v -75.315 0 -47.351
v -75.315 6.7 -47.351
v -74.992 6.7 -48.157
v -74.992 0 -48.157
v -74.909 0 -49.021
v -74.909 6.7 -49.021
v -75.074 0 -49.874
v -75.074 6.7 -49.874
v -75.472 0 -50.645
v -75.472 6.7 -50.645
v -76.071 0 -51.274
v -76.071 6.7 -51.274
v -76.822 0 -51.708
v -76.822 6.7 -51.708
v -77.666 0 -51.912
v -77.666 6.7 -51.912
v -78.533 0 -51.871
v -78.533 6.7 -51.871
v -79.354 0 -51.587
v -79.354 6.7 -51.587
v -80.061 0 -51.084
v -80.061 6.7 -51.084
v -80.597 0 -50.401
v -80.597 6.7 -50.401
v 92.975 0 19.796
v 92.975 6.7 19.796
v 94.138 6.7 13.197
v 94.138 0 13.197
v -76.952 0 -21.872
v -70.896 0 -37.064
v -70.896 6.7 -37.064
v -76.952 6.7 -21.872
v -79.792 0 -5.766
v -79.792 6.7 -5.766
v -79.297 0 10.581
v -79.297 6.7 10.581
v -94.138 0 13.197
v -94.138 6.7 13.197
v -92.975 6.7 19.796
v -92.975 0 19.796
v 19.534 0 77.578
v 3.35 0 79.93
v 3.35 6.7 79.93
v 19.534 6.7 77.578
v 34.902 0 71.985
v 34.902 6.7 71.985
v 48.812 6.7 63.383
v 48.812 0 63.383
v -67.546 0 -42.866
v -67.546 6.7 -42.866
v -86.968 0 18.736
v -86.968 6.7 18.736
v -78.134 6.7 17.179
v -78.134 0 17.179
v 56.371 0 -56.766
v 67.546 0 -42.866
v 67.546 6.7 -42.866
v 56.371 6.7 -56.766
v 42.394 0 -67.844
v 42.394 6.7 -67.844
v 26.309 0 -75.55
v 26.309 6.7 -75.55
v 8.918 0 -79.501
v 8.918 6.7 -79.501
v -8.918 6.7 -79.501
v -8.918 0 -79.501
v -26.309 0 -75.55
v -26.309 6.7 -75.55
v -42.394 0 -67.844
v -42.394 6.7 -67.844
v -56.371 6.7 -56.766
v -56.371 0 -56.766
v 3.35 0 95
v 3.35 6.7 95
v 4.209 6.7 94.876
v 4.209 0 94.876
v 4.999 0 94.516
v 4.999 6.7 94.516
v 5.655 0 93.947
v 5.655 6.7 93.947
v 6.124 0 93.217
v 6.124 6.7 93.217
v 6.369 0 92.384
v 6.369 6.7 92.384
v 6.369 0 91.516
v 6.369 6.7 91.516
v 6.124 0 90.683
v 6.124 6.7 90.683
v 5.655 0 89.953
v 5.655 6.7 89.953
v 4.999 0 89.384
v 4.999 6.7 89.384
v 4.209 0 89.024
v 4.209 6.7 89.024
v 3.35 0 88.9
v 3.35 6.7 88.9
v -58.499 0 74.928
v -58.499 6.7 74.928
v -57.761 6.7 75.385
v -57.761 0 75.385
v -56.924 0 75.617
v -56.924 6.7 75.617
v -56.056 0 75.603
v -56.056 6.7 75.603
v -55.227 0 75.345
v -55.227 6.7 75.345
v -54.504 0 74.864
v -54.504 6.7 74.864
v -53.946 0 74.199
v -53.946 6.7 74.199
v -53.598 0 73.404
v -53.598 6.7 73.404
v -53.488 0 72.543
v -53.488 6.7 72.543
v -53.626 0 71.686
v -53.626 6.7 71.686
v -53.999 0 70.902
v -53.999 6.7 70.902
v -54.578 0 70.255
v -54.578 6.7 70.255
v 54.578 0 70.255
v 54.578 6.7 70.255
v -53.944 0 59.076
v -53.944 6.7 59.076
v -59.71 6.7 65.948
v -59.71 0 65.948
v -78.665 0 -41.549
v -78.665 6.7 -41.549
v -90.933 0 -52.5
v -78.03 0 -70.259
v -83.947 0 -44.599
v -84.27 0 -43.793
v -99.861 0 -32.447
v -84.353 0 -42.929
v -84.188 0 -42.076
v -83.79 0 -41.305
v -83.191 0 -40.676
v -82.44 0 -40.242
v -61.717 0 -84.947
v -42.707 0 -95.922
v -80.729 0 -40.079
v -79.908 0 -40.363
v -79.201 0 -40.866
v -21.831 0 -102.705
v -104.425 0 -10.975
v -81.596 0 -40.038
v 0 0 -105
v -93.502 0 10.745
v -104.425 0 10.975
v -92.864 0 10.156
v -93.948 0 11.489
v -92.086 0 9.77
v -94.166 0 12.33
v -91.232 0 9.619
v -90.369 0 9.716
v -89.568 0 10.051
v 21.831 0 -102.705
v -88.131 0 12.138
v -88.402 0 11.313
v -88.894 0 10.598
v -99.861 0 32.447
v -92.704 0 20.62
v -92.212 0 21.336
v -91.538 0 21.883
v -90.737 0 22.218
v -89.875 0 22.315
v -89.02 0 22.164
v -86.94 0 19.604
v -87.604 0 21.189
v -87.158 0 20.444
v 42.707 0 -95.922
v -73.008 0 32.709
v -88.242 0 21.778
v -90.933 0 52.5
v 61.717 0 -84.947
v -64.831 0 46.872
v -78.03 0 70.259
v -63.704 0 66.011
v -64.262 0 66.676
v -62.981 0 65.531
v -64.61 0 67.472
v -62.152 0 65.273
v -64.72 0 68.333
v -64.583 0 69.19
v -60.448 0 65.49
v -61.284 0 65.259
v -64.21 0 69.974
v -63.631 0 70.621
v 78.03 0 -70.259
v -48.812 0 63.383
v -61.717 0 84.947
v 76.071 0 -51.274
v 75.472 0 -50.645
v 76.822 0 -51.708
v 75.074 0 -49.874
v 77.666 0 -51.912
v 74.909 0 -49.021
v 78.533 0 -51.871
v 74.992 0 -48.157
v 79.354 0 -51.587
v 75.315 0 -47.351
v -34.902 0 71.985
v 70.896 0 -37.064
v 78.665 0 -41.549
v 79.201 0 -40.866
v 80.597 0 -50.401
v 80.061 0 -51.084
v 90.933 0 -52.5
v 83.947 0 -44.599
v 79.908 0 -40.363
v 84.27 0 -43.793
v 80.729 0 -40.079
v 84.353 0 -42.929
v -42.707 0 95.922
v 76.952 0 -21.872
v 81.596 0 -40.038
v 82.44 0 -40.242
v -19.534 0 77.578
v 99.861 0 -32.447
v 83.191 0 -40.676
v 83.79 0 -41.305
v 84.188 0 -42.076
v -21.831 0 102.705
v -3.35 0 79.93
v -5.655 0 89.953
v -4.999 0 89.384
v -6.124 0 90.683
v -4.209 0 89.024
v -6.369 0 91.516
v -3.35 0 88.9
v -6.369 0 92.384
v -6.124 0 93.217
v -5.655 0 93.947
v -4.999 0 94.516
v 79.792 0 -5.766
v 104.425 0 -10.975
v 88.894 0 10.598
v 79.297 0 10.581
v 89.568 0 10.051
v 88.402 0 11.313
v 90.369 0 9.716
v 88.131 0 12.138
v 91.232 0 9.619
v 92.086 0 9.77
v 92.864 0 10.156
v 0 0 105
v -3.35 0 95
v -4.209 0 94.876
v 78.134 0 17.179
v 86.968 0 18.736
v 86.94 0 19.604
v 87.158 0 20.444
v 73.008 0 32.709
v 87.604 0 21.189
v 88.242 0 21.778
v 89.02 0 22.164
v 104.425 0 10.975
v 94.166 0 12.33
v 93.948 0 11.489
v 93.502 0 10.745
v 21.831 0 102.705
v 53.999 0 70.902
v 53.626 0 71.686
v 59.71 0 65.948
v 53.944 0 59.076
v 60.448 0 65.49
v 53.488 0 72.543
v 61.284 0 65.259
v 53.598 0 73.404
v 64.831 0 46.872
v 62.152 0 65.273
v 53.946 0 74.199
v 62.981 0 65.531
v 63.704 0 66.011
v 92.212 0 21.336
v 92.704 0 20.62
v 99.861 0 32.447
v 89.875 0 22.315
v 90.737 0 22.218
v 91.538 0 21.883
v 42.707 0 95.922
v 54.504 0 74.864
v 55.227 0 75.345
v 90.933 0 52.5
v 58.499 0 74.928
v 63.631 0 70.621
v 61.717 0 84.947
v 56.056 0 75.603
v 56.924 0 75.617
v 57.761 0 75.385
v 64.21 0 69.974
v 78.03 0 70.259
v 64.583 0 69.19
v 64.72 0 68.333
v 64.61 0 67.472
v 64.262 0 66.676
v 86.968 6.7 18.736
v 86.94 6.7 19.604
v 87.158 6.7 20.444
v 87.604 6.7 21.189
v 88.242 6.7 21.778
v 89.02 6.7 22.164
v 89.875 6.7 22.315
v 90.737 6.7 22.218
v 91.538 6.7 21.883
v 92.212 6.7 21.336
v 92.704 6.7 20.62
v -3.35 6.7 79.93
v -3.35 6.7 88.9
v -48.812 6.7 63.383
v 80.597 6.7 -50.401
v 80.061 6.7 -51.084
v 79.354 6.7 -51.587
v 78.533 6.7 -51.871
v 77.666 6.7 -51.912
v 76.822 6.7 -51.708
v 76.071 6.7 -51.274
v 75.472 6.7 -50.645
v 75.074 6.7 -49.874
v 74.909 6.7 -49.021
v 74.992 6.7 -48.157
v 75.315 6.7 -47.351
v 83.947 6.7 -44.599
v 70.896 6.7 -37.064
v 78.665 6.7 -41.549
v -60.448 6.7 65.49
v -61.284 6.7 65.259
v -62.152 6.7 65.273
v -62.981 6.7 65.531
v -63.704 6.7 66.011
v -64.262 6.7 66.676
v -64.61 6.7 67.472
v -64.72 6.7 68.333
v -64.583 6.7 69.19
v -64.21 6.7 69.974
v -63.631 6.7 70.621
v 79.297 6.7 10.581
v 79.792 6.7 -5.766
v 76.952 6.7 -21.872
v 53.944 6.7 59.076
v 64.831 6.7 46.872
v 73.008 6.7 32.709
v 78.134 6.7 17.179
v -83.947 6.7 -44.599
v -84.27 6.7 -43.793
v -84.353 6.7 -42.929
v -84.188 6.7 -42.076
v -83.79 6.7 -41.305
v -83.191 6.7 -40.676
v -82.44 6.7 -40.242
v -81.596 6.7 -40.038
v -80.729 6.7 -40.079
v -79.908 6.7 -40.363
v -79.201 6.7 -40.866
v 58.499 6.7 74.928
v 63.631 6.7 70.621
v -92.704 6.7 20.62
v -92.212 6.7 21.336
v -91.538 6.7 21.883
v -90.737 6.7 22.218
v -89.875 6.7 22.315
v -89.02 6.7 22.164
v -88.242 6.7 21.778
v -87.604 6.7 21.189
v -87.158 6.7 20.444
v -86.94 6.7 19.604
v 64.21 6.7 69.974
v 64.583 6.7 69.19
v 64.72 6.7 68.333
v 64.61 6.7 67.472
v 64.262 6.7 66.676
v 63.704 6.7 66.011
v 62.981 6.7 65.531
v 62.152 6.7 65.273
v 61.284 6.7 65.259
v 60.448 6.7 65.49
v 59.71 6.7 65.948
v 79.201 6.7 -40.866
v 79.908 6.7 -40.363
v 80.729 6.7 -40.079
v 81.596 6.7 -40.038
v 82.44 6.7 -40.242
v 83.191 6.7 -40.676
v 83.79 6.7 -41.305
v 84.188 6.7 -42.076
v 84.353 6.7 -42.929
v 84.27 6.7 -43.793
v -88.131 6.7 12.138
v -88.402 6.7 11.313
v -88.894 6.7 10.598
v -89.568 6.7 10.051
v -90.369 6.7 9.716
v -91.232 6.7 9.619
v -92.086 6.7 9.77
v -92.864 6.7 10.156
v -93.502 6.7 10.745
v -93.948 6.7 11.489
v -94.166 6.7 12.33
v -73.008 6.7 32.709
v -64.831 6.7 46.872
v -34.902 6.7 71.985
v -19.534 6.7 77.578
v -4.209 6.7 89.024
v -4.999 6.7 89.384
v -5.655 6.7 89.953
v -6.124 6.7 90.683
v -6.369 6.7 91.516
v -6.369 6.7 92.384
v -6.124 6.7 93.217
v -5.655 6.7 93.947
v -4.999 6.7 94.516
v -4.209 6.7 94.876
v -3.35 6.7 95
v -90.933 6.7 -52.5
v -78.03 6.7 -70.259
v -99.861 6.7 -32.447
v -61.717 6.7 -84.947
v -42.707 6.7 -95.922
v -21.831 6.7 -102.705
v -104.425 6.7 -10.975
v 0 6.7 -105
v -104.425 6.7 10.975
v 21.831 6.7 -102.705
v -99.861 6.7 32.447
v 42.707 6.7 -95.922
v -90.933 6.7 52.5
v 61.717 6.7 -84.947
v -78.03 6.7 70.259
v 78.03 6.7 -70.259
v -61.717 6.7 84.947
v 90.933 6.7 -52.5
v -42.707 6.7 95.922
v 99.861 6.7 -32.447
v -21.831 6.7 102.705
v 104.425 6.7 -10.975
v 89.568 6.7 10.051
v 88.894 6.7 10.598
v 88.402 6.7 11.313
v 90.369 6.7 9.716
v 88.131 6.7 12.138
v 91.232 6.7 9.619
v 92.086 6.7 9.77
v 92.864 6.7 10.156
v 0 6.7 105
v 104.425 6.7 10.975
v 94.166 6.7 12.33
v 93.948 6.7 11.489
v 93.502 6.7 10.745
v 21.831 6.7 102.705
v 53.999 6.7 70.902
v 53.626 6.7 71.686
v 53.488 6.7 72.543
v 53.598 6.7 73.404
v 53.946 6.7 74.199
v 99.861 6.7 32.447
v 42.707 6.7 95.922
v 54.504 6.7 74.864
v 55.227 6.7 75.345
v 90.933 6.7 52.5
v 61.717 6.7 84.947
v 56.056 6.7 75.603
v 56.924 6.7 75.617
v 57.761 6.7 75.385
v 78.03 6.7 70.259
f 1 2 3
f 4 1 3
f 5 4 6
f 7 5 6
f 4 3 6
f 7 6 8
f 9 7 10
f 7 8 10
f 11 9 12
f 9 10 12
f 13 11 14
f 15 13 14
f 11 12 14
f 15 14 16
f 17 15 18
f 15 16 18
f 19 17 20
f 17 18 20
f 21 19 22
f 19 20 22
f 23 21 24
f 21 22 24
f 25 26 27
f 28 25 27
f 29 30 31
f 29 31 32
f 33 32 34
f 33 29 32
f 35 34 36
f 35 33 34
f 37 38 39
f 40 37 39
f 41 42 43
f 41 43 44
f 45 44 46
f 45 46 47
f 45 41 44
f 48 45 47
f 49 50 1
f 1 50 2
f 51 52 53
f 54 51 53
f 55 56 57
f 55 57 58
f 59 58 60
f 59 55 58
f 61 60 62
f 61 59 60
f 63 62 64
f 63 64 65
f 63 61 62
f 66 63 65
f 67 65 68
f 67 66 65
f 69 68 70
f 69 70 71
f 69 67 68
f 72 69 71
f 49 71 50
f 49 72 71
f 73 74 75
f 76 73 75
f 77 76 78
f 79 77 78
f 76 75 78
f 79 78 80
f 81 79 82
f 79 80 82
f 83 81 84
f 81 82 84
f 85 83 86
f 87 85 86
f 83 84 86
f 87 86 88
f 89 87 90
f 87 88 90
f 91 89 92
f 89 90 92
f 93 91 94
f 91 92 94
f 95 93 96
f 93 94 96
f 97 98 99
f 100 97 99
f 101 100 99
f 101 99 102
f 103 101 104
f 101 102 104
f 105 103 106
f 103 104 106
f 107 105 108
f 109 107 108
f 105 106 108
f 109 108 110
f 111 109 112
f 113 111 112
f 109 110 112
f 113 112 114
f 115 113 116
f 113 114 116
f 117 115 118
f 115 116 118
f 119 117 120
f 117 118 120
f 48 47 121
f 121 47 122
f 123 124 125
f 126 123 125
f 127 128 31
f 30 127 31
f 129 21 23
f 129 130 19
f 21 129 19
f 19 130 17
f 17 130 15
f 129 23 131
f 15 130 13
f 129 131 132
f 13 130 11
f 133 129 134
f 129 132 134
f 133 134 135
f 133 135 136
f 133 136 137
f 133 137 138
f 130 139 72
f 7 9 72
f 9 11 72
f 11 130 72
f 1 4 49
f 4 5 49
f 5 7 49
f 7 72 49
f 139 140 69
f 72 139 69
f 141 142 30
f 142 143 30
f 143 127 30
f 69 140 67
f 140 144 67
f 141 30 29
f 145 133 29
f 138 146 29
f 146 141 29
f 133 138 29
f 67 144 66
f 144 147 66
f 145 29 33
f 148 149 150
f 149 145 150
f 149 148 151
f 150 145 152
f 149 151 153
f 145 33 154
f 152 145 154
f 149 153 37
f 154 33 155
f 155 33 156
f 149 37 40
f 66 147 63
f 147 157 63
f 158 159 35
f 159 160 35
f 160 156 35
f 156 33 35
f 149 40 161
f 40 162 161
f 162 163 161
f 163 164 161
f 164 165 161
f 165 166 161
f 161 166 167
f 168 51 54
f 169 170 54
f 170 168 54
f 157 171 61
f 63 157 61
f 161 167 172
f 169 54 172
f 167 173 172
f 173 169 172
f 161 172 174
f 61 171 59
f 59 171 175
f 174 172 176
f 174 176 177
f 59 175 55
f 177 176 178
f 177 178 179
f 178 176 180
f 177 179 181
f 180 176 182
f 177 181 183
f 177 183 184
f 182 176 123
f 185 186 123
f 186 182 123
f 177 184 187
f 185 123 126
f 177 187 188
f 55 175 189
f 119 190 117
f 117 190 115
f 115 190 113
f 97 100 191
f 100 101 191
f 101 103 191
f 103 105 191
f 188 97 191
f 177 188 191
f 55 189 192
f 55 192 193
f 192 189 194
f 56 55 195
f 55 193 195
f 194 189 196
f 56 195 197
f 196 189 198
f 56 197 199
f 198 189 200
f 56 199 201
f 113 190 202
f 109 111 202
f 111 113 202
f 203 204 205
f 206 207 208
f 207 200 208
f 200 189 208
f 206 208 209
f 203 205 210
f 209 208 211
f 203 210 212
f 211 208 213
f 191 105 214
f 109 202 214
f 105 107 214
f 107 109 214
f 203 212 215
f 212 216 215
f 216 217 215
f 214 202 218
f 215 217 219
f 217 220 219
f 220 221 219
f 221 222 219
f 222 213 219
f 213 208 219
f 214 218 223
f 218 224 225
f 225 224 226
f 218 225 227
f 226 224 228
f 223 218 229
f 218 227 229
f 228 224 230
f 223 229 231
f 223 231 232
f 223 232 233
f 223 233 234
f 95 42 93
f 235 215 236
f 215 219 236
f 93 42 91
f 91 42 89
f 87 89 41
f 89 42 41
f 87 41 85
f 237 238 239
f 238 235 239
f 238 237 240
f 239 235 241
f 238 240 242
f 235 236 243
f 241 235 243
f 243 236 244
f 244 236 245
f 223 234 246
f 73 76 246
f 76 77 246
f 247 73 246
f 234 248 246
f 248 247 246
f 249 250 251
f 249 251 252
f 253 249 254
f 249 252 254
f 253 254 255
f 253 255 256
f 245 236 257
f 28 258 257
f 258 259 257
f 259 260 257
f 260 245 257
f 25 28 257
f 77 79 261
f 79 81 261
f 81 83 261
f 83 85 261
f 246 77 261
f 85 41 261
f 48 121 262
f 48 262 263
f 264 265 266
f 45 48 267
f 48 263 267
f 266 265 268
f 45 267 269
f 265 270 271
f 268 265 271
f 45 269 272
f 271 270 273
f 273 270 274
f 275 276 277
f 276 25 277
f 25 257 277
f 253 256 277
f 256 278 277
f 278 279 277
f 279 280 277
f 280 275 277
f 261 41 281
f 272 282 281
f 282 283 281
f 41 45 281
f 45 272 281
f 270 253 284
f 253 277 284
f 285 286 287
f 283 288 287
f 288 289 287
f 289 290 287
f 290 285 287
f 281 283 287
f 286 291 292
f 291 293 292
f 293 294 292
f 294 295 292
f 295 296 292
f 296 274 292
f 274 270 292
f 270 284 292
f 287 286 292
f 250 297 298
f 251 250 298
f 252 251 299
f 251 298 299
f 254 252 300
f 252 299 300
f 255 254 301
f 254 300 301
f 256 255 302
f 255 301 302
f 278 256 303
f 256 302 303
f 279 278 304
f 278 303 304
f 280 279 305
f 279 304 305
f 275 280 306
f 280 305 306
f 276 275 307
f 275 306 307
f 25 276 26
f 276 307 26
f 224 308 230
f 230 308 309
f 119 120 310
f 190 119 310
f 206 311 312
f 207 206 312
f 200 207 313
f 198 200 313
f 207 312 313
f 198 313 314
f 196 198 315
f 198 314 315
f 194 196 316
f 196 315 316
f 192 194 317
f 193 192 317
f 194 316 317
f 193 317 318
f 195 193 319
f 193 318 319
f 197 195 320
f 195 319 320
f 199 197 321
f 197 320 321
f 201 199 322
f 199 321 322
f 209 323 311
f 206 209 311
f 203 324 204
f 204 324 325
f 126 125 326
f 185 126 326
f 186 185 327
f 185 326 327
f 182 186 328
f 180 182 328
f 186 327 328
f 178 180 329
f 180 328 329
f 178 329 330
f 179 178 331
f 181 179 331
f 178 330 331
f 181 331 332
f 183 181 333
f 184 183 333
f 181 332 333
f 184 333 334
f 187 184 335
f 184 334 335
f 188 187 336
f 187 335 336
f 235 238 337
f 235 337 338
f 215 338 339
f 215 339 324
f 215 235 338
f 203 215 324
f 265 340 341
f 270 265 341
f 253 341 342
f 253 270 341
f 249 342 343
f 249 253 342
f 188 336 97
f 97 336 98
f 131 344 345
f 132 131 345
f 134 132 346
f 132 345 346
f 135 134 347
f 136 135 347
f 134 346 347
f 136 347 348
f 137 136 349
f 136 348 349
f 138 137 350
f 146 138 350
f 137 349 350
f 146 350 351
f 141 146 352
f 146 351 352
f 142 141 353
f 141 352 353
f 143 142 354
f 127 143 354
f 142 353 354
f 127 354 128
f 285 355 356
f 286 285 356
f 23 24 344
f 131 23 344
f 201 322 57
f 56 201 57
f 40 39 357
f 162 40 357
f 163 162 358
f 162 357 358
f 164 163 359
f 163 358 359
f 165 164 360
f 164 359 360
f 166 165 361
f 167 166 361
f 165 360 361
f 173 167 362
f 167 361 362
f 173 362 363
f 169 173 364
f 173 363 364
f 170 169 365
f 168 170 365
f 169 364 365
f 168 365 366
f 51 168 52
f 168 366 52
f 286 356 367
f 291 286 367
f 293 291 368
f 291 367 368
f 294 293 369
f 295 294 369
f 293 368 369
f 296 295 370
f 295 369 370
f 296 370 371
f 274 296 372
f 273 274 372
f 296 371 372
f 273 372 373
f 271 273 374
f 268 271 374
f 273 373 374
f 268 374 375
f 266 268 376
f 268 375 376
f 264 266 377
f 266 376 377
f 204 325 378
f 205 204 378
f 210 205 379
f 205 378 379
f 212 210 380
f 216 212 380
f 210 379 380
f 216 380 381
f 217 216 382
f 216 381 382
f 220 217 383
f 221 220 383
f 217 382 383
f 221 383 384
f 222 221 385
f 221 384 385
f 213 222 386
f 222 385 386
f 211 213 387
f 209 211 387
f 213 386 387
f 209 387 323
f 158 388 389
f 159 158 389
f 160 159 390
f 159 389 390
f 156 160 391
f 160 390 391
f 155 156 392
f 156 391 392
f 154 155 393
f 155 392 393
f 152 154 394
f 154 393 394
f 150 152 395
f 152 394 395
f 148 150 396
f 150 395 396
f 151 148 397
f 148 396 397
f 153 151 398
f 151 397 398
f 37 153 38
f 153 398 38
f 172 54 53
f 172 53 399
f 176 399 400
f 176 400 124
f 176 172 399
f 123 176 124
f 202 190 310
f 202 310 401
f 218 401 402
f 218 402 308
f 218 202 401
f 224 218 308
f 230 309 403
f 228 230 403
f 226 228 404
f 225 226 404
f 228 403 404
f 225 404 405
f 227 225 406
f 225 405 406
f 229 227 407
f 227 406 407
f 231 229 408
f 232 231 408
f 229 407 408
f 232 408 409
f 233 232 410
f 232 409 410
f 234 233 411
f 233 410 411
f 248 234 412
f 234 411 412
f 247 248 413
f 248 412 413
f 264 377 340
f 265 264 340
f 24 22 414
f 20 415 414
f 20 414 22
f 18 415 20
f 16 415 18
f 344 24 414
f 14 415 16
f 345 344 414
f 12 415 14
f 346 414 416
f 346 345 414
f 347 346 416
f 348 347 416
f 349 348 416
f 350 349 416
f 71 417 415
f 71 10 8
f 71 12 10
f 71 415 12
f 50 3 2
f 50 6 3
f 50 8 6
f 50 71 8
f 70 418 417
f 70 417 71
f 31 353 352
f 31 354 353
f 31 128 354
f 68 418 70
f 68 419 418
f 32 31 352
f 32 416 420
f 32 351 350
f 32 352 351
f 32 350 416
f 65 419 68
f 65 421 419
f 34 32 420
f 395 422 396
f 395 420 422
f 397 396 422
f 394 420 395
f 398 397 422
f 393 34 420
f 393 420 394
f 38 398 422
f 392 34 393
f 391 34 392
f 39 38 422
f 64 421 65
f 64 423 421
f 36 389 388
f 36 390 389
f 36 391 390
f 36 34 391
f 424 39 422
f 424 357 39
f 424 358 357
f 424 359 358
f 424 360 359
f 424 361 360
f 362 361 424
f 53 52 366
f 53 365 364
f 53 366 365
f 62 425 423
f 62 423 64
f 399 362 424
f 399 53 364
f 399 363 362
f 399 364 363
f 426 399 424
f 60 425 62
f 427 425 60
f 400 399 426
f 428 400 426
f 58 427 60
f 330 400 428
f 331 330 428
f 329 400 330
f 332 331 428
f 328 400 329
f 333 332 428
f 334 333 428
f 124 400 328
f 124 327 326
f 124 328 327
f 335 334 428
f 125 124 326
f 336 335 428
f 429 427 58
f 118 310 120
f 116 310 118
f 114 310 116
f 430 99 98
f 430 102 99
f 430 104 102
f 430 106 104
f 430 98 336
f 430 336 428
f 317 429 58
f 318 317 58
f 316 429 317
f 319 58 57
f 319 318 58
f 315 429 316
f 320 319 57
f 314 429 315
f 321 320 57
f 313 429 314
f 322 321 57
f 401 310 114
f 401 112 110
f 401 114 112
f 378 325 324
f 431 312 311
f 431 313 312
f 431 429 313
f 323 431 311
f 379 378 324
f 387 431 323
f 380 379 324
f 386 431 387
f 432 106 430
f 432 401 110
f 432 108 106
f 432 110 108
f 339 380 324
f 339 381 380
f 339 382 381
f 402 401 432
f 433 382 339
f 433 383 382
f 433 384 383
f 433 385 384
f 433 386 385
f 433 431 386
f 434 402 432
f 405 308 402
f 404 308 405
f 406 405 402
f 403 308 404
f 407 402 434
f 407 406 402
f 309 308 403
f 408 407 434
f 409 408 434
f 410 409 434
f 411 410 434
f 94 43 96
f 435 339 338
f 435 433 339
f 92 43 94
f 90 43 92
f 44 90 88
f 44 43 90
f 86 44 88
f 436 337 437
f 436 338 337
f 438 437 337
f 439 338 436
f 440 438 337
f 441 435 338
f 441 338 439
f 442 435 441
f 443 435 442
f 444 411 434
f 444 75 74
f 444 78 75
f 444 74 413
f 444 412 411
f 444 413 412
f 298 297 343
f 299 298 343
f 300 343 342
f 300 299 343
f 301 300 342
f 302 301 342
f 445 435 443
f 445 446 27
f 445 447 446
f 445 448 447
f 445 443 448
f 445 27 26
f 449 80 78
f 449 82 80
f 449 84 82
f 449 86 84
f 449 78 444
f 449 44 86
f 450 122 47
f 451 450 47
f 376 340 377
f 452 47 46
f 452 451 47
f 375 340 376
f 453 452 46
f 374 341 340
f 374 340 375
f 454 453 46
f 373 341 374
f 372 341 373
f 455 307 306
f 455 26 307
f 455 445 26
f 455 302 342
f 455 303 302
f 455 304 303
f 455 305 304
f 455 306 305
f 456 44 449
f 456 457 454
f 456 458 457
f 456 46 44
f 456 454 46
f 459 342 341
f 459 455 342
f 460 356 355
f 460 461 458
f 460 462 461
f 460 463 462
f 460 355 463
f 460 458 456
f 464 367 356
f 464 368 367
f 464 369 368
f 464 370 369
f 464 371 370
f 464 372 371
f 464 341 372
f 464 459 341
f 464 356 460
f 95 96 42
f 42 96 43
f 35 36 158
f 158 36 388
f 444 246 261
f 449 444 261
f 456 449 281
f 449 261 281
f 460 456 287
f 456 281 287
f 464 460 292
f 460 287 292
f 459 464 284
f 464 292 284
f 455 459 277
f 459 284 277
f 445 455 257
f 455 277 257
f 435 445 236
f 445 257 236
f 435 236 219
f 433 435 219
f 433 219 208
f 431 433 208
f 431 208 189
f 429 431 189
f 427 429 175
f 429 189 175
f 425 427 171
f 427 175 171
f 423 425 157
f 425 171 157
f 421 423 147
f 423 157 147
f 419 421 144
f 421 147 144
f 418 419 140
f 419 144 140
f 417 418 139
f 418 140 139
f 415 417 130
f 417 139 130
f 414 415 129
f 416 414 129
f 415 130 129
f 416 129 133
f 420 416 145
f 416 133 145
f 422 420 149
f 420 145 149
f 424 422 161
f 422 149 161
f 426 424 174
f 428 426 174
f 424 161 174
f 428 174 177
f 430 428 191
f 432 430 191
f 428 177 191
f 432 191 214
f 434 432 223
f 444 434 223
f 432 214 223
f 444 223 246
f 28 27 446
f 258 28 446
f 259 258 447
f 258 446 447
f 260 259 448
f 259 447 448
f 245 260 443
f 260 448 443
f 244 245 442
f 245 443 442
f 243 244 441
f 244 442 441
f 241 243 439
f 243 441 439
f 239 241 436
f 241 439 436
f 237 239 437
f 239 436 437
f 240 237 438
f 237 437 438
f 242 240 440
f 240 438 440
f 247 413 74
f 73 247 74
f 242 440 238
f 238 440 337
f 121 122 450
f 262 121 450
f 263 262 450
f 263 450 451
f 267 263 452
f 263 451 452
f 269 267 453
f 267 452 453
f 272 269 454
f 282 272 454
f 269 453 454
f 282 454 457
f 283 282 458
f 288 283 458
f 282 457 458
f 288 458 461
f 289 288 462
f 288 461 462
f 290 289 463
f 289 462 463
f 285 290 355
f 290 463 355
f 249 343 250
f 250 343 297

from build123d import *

# Parameters (mm, degrees)
SKETCH1_R           = 105
SKETCH1_R_2         = 80
BOSS_EXTRUDE1_DEPTH = 6.7
CUT_EXTRUDE3_DEPTH  = 6.7


with BuildPart() as part:
    # Sketch1 → Boss-Extrude1 (new body)
    with BuildSketch(Plane(origin=(0, 0, 0), x_dir=(1, 0, 0), z_dir=(0, 1, 0))):
        with Locations(Location((0, 0, 0), (0, 0, 270))):
            Circle(SKETCH1_R)
        with Locations(Location((0, 0, 0), (0, 0, 270))):
            Circle(SKETCH1_R_2, mode=Mode.SUBTRACT)
    extrude(amount=BOSS_EXTRUDE1_DEPTH)

    # Sketch2 → Cut-Extrude3 (cut)
    with BuildSketch(Plane(origin=(0, 6.7, 0), x_dir=(1, 0, 0), z_dir=(0, 1, 0))):
        with BuildLine():
            Line((88.131130638, -12.138217022), (74.442302871, -9.724507352))
            Line((74.442302871, -9.724507352), (73.278860081, -16.322719298))
            Line((73.278860081, -16.322719298), (86.967687848, -18.736428967))
            ThreePointArc((86.967687848, -18.736428967), (89.441724552, -22.269719556), (92.975015141, -19.795682851))
            Line((92.975015141, -19.795682851), (94.138457931, -13.197470906))
            ThreePointArc((94.138457931, -13.197470906), (91.664421227, -9.664180317), (88.131130638, -12.138217022))
        make_face()
        with BuildLine():
            Line((75.314658396, 47.351185103), (63.276905284, 40.401185103))
            Line((63.276905284, 40.401185103), (66.626905284, 34.598814897))
            Line((66.626905284, 34.598814897), (78.664658396, 41.548814897))
            ThreePointArc((78.664658396, 41.548814897), (82.831035878, 40.432437416), (83.94741336, 44.598814897))
            Line((83.94741336, 44.598814897), (80.59741336, 50.401185103))
            ThreePointArc((80.59741336, 50.401185103), (76.431035878, 51.517562584), (75.314658396, 47.351185103))
        make_face()
        with BuildLine():
            Line((59.710067386, -65.948012501), (50.775319611, -55.299994741))
            Line((50.775319611, -55.299994741), (45.642821842, -59.606671726))
            Line((45.642821842, -59.606671726), (54.577569617, -70.254689486))
            ThreePointArc((54.577569617, -70.254689486), (54.201636275, -74.551627247), (58.498574036, -74.927560589))
            Line((58.498574036, -74.927560589), (63.631071805, -70.620883604))
            ThreePointArc((63.631071805, -70.620883604), (64.007005147, -66.323945843), (59.710067386, -65.948012501))
        make_face()
        with BuildLine():
            Line((3.35, -88.9), (3.35, -75))
            Line((3.35, -75), (-3.35, -75))
            Line((-3.35, -75), (-3.35, -88.9))
            ThreePointArc((-3.35, -88.9), (-6.4, -91.95), (-3.35, -95))
            Line((-3.35, -95), (3.35, -95))
            ThreePointArc((3.35, -95), (6.4, -91.95), (3.35, -88.9))
        make_face()
        with BuildLine():
            Line((-54.577569617, -70.254689486), (-45.642821842, -59.606671726))
            Line((-45.642821842, -59.606671726), (-50.775319611, -55.299994741))
            Line((-50.775319611, -55.299994741), (-59.710067386, -65.948012501))
            ThreePointArc((-59.710067386, -65.948012501), (-64.007005147, -66.323945843), (-63.631071805, -70.620883604))
            Line((-63.631071805, -70.620883604), (-58.498574036, -74.927560589))
            ThreePointArc((-58.498574036, -74.927560589), (-54.201636275, -74.551627247), (-54.577569617, -70.254689486))
        make_face()
        with BuildLine():
            Line((-86.967687848, -18.736428967), (-73.278860081, -16.322719298))
            Line((-73.278860081, -16.322719298), (-74.442302871, -9.724507352))
            Line((-74.442302871, -9.724507352), (-88.131130638, -12.138217022))
            ThreePointArc((-88.131130638, -12.138217022), (-91.664421227, -9.664180317), (-94.138457931, -13.197470906))
            Line((-94.138457931, -13.197470906), (-92.975015141, -19.795682851))
            ThreePointArc((-92.975015141, -19.795682851), (-89.441724552, -22.269719556), (-86.967687848, -18.736428967))
        make_face()
        with BuildLine():
            Line((-78.664658396, 41.548814897), (-66.626905284, 34.598814897))
            Line((-66.626905284, 34.598814897), (-63.276905284, 40.401185103))
            Line((-63.276905284, 40.401185103), (-75.314658396, 47.351185103))
            ThreePointArc((-75.314658396, 47.351185103), (-76.431035878, 51.517562584), (-80.59741336, 50.401185103))
            Line((-80.59741336, 50.401185103), (-83.94741336, 44.598814897))
            ThreePointArc((-83.94741336, 44.598814897), (-82.831035878, 40.432437416), (-78.664658396, 41.548814897))
        make_face()
    extrude(amount=-CUT_EXTRUDE3_DEPTH, mode=Mode.SUBTRACT)


solid = part.part
